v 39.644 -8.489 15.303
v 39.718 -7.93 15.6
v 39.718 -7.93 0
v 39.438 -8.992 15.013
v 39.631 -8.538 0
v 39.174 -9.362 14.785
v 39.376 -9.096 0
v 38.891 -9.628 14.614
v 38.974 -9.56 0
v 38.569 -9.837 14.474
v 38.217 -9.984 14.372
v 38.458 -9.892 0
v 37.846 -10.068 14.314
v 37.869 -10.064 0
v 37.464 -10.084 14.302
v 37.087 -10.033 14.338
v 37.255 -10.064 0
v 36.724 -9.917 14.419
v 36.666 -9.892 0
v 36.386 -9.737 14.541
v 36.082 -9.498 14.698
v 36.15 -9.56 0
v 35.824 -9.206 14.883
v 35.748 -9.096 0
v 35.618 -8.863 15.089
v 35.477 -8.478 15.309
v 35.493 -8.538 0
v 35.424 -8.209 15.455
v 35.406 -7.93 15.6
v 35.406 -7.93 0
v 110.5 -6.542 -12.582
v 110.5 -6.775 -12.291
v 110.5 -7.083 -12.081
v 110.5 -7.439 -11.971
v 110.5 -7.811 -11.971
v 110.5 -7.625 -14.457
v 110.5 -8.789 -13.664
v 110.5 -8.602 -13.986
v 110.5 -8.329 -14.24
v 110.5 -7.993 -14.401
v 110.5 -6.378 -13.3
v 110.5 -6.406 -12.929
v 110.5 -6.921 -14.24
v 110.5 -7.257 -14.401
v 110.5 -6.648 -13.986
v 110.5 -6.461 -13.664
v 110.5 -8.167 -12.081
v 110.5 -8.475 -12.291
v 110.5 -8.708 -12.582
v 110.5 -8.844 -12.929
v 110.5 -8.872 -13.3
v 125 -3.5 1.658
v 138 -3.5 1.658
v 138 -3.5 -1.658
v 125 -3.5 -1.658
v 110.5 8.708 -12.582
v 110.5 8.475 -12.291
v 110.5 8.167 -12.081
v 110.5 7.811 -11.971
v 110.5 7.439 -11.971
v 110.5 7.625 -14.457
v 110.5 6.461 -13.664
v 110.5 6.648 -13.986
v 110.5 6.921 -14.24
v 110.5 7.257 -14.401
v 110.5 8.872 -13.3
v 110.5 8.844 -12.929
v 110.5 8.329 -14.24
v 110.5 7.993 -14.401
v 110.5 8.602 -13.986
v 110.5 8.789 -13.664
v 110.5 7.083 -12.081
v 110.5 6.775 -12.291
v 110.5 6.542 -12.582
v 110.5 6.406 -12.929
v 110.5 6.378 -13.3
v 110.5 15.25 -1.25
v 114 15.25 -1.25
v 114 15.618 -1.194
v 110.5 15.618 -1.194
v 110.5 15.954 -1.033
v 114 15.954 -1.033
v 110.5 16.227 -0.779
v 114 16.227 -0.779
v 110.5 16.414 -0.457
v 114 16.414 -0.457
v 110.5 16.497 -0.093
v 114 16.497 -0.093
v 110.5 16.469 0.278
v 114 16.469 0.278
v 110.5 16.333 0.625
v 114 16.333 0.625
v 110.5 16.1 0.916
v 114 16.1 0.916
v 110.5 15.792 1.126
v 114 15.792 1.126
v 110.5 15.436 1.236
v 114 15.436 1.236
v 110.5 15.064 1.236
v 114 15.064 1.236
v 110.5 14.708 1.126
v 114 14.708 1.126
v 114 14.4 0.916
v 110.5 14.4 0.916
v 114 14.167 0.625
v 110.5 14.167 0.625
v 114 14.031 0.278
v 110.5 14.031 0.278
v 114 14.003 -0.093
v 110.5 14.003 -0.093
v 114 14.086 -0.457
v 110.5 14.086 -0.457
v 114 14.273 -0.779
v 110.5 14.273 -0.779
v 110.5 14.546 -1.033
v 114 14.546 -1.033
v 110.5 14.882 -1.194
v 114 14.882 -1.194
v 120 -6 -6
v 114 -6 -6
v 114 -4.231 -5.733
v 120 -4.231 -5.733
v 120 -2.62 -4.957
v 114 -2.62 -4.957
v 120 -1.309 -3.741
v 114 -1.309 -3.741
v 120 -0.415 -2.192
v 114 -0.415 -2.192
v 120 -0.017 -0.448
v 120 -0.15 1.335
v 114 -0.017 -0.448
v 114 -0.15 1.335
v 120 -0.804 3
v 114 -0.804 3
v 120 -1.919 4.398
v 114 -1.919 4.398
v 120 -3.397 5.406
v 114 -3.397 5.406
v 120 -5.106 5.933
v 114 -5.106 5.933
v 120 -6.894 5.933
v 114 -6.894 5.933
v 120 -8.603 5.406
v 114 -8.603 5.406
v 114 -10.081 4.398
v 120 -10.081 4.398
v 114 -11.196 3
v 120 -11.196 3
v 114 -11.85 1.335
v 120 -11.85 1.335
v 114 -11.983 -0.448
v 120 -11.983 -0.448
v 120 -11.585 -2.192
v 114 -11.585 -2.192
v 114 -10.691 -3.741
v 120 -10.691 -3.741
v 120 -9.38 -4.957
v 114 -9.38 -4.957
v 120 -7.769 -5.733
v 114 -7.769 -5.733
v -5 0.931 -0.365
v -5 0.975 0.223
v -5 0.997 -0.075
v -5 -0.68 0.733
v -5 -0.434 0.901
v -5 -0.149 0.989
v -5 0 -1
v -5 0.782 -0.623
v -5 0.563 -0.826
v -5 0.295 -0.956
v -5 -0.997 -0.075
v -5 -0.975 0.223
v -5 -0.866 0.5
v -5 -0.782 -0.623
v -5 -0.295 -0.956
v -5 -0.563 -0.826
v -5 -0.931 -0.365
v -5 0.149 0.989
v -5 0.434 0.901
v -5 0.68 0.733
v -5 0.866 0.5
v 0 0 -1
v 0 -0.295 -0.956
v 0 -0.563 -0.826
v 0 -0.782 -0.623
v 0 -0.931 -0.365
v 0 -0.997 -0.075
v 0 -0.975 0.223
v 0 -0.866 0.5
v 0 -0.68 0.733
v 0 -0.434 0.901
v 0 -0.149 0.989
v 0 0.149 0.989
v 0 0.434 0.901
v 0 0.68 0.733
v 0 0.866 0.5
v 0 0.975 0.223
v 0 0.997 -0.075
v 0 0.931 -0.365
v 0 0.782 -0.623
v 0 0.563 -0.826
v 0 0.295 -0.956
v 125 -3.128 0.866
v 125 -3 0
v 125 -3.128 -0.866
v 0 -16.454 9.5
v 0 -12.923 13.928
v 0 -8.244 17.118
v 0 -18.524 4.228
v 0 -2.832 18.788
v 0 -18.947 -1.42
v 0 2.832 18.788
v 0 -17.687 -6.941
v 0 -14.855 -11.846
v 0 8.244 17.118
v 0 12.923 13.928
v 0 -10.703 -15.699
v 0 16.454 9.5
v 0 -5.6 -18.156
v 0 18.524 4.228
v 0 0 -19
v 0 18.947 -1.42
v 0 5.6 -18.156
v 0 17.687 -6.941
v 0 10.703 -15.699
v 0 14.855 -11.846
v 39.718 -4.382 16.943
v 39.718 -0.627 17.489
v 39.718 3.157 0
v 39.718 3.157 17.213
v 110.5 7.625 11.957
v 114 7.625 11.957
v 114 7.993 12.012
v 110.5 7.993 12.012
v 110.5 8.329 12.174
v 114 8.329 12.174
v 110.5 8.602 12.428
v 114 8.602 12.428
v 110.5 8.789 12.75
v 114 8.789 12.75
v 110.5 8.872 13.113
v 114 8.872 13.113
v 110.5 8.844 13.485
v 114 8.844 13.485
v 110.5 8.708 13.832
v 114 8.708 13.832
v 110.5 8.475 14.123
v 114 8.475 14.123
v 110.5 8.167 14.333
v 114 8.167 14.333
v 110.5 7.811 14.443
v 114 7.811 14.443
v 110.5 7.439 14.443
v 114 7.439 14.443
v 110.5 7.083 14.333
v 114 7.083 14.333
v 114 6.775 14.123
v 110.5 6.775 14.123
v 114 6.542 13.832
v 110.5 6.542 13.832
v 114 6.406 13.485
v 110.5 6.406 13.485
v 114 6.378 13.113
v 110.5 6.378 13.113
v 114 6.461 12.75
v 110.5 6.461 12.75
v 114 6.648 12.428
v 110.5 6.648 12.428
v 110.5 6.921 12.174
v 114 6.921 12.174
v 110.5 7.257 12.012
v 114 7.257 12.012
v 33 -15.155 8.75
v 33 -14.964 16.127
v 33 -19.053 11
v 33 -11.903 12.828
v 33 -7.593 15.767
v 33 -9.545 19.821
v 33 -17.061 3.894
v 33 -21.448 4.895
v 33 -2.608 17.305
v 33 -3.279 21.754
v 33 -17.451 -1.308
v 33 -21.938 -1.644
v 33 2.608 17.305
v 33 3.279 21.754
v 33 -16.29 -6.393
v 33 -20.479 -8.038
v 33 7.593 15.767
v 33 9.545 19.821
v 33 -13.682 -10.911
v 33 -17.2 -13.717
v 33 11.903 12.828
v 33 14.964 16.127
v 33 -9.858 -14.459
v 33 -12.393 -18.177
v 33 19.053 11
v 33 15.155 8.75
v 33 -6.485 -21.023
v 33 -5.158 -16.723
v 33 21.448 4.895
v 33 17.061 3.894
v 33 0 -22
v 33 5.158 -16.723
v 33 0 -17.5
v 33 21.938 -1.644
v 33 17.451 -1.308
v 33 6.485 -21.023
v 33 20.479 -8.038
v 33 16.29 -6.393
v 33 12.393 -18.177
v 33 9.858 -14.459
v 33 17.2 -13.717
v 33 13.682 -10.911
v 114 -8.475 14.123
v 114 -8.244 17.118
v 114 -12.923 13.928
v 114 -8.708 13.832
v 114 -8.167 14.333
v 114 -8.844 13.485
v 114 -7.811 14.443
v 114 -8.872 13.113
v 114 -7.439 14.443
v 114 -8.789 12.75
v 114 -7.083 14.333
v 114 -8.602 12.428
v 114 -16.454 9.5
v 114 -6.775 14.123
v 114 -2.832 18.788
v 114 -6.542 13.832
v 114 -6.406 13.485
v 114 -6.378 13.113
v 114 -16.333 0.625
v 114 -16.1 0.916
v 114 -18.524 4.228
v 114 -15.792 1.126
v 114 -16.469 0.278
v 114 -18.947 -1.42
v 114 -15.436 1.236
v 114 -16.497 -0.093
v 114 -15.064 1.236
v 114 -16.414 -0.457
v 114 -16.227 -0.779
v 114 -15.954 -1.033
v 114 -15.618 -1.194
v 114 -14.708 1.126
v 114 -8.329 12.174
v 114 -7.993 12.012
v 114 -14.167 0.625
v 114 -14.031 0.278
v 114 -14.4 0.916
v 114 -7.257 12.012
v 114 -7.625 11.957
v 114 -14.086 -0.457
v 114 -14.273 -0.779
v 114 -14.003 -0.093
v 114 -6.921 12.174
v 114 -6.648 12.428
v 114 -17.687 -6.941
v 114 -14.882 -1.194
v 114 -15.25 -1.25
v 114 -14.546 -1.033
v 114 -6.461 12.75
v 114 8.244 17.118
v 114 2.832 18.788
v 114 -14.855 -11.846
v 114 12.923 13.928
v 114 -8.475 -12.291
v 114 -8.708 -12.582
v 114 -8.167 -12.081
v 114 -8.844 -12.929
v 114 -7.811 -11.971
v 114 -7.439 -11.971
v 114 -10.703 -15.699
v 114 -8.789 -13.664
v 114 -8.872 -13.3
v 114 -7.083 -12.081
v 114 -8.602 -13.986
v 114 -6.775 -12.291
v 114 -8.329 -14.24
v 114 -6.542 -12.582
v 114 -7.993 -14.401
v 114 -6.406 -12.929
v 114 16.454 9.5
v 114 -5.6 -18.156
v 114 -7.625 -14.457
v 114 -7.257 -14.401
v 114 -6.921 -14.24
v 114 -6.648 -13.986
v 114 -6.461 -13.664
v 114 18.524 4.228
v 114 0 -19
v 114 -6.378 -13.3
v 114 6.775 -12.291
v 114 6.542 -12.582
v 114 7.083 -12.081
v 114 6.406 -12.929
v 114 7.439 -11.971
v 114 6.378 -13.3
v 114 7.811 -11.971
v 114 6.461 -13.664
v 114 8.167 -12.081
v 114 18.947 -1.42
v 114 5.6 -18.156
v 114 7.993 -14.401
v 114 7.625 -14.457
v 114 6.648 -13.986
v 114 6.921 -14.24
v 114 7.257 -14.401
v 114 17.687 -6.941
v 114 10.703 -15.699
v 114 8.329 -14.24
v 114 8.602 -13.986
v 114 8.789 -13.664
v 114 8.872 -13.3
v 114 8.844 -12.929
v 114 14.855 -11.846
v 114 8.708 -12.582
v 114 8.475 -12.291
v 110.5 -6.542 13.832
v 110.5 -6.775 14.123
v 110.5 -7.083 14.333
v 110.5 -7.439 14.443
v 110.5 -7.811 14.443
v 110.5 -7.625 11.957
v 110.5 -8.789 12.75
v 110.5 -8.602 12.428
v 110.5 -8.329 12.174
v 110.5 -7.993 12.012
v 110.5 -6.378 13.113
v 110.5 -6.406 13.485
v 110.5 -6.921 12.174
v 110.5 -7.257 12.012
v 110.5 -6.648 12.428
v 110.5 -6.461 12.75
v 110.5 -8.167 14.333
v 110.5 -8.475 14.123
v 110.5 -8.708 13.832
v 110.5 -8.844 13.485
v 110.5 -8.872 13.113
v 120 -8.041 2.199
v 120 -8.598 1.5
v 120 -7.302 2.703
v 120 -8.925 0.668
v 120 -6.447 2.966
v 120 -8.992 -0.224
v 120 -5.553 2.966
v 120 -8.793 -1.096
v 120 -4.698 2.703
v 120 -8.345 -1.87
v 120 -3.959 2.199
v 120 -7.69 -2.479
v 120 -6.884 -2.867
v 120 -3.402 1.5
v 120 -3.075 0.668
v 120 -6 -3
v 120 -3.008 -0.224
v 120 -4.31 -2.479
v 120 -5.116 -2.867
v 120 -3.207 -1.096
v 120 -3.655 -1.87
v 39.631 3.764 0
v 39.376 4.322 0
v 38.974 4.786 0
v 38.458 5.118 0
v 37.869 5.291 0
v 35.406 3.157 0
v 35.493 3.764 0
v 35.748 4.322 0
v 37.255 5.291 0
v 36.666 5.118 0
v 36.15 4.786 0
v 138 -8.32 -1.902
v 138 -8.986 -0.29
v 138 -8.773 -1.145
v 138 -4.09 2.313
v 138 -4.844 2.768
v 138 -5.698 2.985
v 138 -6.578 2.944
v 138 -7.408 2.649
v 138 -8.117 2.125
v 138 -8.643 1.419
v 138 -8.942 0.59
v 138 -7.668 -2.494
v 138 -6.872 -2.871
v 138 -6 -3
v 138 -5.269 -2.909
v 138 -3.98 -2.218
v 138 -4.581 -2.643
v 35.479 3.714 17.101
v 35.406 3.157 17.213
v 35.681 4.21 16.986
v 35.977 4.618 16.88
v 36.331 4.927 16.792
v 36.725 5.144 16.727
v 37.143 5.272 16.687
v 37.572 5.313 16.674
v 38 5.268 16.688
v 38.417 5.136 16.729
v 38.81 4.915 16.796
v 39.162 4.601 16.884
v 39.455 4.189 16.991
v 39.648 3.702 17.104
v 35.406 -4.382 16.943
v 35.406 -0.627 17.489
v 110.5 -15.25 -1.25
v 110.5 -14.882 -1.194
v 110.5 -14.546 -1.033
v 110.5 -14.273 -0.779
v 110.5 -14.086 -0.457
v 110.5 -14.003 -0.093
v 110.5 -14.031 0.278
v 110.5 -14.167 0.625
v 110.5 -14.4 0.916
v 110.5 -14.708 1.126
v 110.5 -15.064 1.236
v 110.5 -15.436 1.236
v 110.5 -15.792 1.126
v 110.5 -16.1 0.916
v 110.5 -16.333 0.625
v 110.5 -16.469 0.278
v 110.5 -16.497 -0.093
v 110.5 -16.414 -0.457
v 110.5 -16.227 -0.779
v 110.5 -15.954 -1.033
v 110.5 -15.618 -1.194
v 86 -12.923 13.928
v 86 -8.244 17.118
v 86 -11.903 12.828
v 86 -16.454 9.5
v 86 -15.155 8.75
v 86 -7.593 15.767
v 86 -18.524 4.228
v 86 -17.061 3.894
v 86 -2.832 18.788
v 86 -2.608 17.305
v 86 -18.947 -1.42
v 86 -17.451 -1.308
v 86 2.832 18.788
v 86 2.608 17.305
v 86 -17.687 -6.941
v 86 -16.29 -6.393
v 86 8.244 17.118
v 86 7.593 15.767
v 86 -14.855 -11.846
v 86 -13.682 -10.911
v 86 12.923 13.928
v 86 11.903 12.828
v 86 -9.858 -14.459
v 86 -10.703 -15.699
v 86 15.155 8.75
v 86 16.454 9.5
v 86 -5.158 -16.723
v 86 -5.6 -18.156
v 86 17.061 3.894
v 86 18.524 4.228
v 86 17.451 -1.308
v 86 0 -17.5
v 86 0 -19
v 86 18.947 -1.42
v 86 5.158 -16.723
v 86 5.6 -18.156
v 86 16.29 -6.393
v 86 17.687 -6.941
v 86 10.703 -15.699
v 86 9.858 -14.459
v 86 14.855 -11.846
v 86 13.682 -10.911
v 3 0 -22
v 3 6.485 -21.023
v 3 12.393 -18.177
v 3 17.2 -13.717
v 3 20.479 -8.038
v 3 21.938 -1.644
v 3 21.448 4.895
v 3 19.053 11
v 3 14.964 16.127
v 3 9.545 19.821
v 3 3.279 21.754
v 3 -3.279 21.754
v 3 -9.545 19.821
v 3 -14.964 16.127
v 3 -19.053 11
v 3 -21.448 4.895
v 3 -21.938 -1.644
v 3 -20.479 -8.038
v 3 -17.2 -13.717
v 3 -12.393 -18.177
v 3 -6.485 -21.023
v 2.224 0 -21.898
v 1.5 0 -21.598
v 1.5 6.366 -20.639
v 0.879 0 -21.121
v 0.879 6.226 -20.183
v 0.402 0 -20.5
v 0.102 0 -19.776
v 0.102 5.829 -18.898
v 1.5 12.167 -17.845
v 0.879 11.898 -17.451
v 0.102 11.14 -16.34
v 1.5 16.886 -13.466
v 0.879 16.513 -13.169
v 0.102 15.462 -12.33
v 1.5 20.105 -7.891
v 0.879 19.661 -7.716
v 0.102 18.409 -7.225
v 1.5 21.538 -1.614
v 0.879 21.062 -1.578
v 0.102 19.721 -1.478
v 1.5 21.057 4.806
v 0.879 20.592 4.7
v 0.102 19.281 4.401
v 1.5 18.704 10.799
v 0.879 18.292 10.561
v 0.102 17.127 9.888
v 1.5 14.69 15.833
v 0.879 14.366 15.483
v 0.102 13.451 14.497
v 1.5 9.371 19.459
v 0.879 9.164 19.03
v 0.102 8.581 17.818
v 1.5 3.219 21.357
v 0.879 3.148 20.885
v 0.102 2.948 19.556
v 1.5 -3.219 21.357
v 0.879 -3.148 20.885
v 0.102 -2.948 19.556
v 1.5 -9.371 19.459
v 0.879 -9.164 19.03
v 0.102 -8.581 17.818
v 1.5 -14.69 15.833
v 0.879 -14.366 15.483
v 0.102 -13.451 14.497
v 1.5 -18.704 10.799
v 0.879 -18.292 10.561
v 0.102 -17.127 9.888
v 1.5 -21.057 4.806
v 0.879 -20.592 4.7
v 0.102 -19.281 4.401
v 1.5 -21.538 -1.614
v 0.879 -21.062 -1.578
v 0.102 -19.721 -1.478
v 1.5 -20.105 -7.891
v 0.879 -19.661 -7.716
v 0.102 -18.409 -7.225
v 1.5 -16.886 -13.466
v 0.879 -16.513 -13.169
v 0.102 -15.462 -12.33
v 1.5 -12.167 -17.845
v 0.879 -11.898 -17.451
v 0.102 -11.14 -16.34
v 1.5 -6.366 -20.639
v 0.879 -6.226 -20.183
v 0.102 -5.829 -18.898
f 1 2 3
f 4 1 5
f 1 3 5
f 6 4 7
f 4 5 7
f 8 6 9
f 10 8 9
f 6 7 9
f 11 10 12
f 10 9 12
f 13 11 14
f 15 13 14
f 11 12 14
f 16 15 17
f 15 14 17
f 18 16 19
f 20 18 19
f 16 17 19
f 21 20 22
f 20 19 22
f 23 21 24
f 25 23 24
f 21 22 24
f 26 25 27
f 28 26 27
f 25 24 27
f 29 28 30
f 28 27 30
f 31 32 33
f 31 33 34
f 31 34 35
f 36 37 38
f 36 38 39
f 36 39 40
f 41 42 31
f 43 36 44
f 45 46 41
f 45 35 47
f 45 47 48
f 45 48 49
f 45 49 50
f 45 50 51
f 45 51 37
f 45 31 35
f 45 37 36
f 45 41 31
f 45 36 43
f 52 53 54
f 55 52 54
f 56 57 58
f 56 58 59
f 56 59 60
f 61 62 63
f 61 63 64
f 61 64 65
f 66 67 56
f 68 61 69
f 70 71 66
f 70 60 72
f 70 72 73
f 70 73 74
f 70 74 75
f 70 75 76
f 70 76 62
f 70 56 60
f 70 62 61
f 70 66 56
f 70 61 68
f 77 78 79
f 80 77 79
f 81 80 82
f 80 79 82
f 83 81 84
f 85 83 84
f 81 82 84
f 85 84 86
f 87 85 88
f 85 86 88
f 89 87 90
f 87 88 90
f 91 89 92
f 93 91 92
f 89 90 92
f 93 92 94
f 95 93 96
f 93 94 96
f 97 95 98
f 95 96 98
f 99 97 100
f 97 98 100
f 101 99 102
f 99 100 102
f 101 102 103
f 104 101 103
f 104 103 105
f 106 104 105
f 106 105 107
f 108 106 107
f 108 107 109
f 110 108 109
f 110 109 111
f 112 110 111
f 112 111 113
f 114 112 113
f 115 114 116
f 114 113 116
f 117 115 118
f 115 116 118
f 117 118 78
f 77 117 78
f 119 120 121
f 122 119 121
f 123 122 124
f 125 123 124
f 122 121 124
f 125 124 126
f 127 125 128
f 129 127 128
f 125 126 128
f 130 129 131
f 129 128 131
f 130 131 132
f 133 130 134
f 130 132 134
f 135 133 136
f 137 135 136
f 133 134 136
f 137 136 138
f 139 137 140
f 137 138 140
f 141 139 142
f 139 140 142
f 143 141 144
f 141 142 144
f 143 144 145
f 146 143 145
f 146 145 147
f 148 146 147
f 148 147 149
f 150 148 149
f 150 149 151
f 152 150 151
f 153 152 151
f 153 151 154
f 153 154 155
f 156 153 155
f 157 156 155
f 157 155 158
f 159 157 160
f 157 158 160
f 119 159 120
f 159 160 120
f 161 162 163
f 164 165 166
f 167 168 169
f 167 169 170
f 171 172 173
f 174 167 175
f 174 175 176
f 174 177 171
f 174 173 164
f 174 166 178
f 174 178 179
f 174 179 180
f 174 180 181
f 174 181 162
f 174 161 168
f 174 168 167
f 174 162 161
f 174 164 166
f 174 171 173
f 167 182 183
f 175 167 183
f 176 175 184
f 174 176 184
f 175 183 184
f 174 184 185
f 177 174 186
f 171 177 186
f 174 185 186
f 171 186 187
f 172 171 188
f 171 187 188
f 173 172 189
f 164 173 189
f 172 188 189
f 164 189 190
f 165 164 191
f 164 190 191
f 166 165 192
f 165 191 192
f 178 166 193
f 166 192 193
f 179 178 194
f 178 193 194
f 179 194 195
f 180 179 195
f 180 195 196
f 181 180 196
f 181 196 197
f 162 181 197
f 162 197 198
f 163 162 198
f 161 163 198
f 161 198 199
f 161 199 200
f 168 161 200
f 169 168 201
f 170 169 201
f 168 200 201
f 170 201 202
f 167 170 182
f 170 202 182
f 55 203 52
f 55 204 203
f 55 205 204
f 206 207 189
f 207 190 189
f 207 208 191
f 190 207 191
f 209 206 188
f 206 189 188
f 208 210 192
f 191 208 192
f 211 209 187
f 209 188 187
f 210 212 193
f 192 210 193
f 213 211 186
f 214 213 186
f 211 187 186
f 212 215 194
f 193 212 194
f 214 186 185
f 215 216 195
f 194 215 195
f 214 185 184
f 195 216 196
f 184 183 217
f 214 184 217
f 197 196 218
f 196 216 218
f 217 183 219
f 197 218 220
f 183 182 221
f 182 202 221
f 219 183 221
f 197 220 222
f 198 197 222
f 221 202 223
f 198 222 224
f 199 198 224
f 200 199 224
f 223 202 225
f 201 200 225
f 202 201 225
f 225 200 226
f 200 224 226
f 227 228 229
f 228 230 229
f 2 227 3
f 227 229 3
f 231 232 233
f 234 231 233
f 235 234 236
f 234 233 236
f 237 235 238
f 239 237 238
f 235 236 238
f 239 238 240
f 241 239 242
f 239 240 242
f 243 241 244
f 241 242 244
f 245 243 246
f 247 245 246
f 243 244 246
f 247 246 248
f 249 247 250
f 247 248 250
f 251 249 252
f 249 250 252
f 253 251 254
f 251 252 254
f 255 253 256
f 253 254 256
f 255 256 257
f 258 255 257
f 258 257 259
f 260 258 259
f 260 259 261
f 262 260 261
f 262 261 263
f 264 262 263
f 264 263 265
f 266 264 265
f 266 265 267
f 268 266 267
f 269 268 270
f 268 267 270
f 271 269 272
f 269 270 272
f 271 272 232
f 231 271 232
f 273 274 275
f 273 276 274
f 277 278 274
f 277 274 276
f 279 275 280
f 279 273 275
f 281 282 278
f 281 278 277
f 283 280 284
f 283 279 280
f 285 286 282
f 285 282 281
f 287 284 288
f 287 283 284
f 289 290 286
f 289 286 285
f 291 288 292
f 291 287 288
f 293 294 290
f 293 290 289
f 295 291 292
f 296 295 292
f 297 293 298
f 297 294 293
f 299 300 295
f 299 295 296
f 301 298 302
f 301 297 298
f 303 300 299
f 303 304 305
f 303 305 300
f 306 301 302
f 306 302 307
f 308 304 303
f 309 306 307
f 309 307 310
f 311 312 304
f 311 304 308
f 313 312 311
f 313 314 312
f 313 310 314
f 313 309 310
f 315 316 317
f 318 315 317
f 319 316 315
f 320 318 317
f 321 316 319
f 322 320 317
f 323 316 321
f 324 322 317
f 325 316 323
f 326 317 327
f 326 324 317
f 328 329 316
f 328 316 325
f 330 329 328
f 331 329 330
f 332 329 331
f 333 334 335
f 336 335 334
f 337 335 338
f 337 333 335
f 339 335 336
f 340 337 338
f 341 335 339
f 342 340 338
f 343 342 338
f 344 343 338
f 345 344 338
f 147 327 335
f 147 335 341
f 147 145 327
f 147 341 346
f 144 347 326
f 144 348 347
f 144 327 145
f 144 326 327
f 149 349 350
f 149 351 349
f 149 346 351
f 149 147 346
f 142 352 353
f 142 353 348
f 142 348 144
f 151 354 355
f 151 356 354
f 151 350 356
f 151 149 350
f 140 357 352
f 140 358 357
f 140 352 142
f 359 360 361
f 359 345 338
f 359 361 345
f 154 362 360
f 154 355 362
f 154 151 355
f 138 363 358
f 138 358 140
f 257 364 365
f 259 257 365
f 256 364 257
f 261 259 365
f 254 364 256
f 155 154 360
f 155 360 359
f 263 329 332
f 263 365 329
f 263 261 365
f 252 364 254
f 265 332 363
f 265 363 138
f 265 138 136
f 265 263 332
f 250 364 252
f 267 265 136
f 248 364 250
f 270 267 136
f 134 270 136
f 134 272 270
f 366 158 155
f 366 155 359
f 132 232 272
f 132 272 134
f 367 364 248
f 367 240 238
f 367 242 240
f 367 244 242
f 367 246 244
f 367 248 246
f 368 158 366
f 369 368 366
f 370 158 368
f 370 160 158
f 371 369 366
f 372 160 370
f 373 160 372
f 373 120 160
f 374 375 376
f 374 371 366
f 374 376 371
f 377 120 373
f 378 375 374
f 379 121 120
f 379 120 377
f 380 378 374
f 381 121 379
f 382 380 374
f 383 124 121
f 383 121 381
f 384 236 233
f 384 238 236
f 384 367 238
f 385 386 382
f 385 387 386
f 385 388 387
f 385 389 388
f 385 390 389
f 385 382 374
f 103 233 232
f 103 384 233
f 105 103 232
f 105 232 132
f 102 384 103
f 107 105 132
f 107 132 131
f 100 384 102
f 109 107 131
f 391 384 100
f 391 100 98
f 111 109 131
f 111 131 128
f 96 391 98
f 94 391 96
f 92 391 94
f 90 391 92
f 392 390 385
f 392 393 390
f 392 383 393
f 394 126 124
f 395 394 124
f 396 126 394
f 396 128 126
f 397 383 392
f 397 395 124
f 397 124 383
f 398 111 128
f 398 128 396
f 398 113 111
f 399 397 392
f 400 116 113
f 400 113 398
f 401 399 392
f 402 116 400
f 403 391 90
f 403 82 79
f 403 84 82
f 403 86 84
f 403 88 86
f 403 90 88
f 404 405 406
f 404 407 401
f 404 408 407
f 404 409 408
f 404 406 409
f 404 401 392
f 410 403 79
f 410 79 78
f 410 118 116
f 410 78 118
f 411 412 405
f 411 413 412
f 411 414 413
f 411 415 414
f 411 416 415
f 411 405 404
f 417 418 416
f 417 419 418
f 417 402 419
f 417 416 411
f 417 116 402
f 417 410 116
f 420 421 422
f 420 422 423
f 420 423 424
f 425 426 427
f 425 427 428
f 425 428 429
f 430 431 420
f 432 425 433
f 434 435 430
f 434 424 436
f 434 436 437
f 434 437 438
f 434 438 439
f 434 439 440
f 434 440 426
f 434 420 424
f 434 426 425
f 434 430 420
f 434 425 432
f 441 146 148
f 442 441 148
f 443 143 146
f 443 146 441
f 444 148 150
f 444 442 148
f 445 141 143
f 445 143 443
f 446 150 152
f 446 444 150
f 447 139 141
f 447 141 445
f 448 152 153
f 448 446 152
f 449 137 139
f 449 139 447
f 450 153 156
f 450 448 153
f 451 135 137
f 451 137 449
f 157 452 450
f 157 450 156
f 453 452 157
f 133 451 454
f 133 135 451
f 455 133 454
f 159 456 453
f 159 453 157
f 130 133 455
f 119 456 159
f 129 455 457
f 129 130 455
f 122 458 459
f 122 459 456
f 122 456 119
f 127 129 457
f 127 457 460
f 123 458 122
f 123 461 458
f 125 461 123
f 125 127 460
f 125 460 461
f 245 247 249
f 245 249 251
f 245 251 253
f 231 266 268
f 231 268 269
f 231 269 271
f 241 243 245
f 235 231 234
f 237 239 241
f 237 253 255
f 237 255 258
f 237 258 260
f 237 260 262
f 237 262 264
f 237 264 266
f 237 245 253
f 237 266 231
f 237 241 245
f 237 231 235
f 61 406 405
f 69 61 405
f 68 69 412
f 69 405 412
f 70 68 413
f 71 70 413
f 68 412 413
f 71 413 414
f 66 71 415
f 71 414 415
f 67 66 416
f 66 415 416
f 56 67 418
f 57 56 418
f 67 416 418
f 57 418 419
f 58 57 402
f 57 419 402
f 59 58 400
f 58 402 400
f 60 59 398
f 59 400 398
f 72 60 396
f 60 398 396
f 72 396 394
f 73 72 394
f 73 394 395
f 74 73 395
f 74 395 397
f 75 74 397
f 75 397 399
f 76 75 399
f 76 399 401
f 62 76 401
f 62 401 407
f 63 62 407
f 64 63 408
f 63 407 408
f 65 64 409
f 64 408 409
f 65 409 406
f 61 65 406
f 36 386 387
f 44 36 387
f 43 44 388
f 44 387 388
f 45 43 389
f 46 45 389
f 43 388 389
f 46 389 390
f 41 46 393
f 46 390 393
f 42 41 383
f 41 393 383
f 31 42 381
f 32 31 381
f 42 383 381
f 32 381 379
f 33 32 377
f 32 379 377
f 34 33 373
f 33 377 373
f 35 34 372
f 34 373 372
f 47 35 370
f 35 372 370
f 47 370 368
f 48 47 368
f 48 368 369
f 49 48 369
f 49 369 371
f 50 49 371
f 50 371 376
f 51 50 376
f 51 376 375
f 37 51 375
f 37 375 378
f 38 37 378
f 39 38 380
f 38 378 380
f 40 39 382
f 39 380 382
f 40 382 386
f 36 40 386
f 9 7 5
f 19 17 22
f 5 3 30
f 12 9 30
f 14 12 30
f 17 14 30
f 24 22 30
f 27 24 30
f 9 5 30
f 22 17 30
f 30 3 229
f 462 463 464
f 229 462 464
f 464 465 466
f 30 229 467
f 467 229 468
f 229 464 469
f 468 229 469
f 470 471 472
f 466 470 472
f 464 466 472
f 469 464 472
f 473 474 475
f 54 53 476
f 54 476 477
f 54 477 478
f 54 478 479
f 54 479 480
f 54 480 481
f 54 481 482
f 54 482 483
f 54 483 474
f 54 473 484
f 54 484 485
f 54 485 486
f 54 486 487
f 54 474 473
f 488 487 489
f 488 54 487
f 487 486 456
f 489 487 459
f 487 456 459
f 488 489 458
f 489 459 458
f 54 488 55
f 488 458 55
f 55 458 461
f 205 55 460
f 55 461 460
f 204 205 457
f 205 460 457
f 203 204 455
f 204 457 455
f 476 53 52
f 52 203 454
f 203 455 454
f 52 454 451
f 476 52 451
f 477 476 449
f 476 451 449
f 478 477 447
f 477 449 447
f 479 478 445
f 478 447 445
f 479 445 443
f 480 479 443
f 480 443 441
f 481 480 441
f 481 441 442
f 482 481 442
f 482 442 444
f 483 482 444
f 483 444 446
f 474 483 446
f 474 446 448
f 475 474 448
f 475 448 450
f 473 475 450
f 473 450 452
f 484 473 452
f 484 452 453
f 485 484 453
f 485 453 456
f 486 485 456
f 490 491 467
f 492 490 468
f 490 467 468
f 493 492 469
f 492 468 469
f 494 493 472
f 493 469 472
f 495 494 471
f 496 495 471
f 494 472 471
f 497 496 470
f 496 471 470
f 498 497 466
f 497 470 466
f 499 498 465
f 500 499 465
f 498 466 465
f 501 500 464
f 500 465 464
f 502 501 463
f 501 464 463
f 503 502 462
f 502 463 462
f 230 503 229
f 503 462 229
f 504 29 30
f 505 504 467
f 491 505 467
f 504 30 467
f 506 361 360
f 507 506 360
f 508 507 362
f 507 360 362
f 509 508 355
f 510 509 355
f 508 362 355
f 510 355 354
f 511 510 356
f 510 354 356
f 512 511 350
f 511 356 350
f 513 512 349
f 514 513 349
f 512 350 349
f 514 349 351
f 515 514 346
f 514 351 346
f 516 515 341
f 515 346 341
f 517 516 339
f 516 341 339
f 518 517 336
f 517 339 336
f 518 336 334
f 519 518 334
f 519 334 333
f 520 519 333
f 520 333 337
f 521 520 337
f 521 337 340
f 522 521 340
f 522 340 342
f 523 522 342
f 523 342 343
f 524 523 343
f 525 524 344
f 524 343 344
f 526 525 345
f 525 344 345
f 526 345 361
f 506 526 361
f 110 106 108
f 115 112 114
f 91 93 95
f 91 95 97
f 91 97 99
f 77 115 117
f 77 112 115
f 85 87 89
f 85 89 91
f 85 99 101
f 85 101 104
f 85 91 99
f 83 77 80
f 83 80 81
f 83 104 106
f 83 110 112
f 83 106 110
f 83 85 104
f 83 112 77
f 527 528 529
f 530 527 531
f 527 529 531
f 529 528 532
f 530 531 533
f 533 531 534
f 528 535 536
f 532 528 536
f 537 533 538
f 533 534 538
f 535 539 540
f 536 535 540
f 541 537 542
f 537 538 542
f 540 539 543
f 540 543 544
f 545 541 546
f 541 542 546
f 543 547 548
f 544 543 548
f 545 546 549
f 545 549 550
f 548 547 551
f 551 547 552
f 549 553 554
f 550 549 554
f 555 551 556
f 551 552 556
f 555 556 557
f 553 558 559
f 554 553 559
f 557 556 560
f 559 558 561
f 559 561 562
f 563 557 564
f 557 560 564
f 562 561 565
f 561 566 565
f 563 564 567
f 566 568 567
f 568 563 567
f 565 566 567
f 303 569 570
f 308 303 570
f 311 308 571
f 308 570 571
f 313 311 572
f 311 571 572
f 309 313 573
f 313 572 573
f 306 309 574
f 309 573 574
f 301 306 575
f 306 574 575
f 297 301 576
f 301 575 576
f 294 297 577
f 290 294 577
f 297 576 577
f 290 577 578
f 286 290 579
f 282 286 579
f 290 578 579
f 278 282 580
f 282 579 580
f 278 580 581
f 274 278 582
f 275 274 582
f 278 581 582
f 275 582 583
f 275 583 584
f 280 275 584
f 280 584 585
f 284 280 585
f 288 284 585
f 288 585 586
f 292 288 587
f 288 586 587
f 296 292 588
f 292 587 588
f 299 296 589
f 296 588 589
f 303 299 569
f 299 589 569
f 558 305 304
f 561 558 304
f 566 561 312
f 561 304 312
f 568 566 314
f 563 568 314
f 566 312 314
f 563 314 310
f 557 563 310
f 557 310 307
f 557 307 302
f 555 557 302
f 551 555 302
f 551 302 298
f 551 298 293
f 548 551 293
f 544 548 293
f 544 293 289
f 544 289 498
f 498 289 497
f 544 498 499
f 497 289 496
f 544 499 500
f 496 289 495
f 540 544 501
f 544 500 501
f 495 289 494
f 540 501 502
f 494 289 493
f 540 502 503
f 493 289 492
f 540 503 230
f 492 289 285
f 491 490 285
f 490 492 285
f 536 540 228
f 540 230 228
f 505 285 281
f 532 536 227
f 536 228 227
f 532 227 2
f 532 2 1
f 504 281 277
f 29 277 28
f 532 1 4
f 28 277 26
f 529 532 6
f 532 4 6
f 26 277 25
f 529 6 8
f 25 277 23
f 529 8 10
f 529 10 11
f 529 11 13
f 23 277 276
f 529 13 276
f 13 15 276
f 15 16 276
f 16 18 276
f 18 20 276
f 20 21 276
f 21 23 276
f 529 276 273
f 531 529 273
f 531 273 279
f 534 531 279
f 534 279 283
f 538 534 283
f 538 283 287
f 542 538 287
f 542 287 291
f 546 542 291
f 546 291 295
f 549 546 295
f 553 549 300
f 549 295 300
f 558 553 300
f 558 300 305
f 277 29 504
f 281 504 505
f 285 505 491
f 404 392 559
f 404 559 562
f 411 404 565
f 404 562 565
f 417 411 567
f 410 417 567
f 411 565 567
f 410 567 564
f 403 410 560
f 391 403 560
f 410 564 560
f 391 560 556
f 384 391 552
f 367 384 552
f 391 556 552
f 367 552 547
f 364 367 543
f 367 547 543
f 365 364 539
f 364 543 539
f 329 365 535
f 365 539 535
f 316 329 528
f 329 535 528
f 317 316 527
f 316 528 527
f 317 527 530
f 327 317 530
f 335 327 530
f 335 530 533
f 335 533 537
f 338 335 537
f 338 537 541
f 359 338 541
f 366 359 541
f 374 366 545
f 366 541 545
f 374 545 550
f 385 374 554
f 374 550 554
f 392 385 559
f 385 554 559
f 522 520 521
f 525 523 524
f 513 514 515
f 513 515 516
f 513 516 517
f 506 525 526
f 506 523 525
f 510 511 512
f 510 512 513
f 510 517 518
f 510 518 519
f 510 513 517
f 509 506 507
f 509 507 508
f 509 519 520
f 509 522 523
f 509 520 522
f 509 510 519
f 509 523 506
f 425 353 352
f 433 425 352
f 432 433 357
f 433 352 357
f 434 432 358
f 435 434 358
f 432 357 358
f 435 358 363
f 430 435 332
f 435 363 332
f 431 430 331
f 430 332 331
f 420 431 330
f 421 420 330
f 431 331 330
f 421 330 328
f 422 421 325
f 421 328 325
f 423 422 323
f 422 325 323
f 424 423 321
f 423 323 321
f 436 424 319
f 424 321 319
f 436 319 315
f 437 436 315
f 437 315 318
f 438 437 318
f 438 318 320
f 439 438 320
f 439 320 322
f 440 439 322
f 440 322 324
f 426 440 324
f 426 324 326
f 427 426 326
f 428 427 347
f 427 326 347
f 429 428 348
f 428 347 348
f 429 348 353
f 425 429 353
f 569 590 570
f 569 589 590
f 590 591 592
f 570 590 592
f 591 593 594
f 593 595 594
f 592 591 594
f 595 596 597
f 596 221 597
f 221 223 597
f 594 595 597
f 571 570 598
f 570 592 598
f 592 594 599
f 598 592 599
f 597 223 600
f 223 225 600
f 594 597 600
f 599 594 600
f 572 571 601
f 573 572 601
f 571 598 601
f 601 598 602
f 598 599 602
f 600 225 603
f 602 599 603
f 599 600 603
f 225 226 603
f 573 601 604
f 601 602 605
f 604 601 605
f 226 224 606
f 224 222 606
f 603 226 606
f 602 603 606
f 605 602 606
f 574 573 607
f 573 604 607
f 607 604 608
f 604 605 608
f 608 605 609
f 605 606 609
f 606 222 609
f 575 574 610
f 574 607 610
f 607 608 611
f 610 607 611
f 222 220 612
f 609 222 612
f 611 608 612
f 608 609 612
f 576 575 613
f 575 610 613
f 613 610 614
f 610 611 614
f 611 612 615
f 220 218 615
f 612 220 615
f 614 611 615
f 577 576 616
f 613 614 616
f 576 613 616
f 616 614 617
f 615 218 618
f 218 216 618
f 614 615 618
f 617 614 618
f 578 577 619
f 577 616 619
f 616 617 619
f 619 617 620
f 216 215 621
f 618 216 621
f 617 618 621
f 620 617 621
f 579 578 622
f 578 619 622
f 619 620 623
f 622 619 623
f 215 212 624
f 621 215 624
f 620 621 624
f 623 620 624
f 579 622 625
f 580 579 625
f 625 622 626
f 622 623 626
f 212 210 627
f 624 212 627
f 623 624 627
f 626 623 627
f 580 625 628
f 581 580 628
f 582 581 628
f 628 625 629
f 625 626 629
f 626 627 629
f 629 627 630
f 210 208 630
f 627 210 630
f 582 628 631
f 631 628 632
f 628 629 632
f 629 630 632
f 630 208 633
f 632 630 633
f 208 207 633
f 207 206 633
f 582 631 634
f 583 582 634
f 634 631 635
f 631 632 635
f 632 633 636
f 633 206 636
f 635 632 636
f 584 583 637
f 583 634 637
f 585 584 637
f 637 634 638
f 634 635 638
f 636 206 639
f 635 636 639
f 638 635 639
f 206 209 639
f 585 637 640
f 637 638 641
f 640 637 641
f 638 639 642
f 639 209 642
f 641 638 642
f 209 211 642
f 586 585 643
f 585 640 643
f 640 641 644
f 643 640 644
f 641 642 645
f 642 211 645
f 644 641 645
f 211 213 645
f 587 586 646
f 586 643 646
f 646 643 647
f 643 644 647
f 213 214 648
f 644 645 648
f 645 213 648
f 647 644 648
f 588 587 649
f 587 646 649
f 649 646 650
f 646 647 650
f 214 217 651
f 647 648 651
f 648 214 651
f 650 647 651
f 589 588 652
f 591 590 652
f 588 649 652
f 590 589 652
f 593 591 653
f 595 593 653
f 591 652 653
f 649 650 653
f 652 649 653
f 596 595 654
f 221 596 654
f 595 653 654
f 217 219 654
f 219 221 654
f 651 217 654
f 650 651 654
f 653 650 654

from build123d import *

# Parameters (mm, degrees)
SKETCH1_R           = 22
BOSS_EXTRUDE1_DEPTH = 33
SKETCH2_R           = 17.5
BOSS_EXTRUDE2_DEPTH = 53
SKETCH4_R           = 19
BOSS_EXTRUDE3_DEPTH = 28
CUT_EXTRUDE1_DEPTH  = 119.169369974
SKETCH13_R          = 1.25
CUT_EXTRUDE2_DEPTH  = 3.5
SKETCH15_R          = 6
BOSS_EXTRUDE4_DEPTH = 6
SKETCH16_R          = 3
BOSS_EXTRUDE5_DEPTH = 24
CUT_EXTRUDE3_DEPTH  = 13
FILLET1_R           = 3
SKETCH18_R          = 1
BOSS_EXTRUDE6_DEPTH = 5


with BuildPart() as part:
    # Sketch1 → Boss-Extrude1 (new body)
    with BuildSketch(Plane(origin=(0, 0, 0), x_dir=(0, 0, -1), z_dir=(1, 0, 0))):
        Circle(SKETCH1_R)
    extrude(amount=BOSS_EXTRUDE1_DEPTH)

    # Sketch2 → Boss-Extrude2 (add)
    with BuildSketch(Plane(origin=(33, 0, 0), x_dir=(0, 0, -1), z_dir=(1, 0, 0))):
        Circle(SKETCH2_R)
    extrude(amount=BOSS_EXTRUDE2_DEPTH)

    # Sketch4 → Boss-Extrude3 (add)
    with BuildSketch(Plane(origin=(86, 0, 0), x_dir=(0, 0, -1), z_dir=(1, 0, 0))):
        Circle(SKETCH4_R)
    extrude(amount=BOSS_EXTRUDE3_DEPTH)

    # Sketch12 → Cut-Extrude1 (cut, through all)
    with BuildSketch(Plane.XY):
        with BuildLine():
            Line((39.717889668, 3.156796221), (39.717889668, -7.930488068))
            ThreePointArc((39.717889668, -7.930488068), (37.562028834, -10.086348902), (35.406168, -7.930488068))
            Line((35.406168, -7.930488068), (35.406168, 3.156796221))
            ThreePointArc((35.406168, 3.156796221), (37.562028834, 5.312657055), (39.717889668, 3.156796221))
        make_face()
    extrude(amount=CUT_EXTRUDE1_DEPTH, mode=Mode.SUBTRACT)

    # Sketch13 → Cut-Extrude2 (cut)
    with BuildSketch(Plane(origin=(114, 0, 0), x_dir=(0, 0, -1), z_dir=(1, 0, 0))):
        with Locations((0, 15.25)):
            Circle(SKETCH13_R)
        with Locations((13.206887408, 7.625)):
            Circle(SKETCH13_R)
        with Locations((13.206887408, -7.625)):
            Circle(SKETCH13_R)
        with Locations((0, -15.25)):
            Circle(SKETCH13_R)
        with Locations((-13.206887408, -7.625)):
            Circle(SKETCH13_R)
        with Locations((-13.206887408, 7.625)):
            Circle(SKETCH13_R)
    extrude(amount=-CUT_EXTRUDE2_DEPTH, mode=Mode.SUBTRACT)

    # Sketch15 → Boss-Extrude4 (add)
    with BuildSketch(Plane(origin=(114, 0, 0), x_dir=(0, 0, -1), z_dir=(1, 0, 0))):
        with Locations((0, -6)):
            Circle(SKETCH15_R)
    extrude(amount=BOSS_EXTRUDE4_DEPTH)

    # Sketch16 → Boss-Extrude5 (add)
    with BuildSketch(Plane(origin=(114, 0, 0), x_dir=(0, 0, -1), z_dir=(1, 0, 0))):
        with Locations((0, -6)):
            Circle(SKETCH16_R)
    extrude(amount=BOSS_EXTRUDE5_DEPTH)

    # Sketch17 → Cut-Extrude3 (cut)
    with BuildSketch(Plane(origin=(138, 0, 0), x_dir=(0, 0, -1), z_dir=(1, 0, 0))):
        Polygon((1.658312395, -3.5), (3, -3.5), (3, -1.535610447), (1.658312395, -1.535610447), (-2.178415849, -1.535610447), (-2.178415849, -3.5), align=None)
    extrude(amount=-CUT_EXTRUDE3_DEPTH, mode=Mode.SUBTRACT)

    # Fillet1
    fillet1_edges = [part.edges().sort_by_distance(p)[0] for p in [
        (0, 0, 22),
    ]]
    fillet(fillet1_edges, radius=FILLET1_R)

    # Sketch18 → Boss-Extrude6 (add)
    with BuildSketch(Plane.ZY):
        Circle(SKETCH18_R)
    extrude(amount=BOSS_EXTRUDE6_DEPTH)


solid = part.part
